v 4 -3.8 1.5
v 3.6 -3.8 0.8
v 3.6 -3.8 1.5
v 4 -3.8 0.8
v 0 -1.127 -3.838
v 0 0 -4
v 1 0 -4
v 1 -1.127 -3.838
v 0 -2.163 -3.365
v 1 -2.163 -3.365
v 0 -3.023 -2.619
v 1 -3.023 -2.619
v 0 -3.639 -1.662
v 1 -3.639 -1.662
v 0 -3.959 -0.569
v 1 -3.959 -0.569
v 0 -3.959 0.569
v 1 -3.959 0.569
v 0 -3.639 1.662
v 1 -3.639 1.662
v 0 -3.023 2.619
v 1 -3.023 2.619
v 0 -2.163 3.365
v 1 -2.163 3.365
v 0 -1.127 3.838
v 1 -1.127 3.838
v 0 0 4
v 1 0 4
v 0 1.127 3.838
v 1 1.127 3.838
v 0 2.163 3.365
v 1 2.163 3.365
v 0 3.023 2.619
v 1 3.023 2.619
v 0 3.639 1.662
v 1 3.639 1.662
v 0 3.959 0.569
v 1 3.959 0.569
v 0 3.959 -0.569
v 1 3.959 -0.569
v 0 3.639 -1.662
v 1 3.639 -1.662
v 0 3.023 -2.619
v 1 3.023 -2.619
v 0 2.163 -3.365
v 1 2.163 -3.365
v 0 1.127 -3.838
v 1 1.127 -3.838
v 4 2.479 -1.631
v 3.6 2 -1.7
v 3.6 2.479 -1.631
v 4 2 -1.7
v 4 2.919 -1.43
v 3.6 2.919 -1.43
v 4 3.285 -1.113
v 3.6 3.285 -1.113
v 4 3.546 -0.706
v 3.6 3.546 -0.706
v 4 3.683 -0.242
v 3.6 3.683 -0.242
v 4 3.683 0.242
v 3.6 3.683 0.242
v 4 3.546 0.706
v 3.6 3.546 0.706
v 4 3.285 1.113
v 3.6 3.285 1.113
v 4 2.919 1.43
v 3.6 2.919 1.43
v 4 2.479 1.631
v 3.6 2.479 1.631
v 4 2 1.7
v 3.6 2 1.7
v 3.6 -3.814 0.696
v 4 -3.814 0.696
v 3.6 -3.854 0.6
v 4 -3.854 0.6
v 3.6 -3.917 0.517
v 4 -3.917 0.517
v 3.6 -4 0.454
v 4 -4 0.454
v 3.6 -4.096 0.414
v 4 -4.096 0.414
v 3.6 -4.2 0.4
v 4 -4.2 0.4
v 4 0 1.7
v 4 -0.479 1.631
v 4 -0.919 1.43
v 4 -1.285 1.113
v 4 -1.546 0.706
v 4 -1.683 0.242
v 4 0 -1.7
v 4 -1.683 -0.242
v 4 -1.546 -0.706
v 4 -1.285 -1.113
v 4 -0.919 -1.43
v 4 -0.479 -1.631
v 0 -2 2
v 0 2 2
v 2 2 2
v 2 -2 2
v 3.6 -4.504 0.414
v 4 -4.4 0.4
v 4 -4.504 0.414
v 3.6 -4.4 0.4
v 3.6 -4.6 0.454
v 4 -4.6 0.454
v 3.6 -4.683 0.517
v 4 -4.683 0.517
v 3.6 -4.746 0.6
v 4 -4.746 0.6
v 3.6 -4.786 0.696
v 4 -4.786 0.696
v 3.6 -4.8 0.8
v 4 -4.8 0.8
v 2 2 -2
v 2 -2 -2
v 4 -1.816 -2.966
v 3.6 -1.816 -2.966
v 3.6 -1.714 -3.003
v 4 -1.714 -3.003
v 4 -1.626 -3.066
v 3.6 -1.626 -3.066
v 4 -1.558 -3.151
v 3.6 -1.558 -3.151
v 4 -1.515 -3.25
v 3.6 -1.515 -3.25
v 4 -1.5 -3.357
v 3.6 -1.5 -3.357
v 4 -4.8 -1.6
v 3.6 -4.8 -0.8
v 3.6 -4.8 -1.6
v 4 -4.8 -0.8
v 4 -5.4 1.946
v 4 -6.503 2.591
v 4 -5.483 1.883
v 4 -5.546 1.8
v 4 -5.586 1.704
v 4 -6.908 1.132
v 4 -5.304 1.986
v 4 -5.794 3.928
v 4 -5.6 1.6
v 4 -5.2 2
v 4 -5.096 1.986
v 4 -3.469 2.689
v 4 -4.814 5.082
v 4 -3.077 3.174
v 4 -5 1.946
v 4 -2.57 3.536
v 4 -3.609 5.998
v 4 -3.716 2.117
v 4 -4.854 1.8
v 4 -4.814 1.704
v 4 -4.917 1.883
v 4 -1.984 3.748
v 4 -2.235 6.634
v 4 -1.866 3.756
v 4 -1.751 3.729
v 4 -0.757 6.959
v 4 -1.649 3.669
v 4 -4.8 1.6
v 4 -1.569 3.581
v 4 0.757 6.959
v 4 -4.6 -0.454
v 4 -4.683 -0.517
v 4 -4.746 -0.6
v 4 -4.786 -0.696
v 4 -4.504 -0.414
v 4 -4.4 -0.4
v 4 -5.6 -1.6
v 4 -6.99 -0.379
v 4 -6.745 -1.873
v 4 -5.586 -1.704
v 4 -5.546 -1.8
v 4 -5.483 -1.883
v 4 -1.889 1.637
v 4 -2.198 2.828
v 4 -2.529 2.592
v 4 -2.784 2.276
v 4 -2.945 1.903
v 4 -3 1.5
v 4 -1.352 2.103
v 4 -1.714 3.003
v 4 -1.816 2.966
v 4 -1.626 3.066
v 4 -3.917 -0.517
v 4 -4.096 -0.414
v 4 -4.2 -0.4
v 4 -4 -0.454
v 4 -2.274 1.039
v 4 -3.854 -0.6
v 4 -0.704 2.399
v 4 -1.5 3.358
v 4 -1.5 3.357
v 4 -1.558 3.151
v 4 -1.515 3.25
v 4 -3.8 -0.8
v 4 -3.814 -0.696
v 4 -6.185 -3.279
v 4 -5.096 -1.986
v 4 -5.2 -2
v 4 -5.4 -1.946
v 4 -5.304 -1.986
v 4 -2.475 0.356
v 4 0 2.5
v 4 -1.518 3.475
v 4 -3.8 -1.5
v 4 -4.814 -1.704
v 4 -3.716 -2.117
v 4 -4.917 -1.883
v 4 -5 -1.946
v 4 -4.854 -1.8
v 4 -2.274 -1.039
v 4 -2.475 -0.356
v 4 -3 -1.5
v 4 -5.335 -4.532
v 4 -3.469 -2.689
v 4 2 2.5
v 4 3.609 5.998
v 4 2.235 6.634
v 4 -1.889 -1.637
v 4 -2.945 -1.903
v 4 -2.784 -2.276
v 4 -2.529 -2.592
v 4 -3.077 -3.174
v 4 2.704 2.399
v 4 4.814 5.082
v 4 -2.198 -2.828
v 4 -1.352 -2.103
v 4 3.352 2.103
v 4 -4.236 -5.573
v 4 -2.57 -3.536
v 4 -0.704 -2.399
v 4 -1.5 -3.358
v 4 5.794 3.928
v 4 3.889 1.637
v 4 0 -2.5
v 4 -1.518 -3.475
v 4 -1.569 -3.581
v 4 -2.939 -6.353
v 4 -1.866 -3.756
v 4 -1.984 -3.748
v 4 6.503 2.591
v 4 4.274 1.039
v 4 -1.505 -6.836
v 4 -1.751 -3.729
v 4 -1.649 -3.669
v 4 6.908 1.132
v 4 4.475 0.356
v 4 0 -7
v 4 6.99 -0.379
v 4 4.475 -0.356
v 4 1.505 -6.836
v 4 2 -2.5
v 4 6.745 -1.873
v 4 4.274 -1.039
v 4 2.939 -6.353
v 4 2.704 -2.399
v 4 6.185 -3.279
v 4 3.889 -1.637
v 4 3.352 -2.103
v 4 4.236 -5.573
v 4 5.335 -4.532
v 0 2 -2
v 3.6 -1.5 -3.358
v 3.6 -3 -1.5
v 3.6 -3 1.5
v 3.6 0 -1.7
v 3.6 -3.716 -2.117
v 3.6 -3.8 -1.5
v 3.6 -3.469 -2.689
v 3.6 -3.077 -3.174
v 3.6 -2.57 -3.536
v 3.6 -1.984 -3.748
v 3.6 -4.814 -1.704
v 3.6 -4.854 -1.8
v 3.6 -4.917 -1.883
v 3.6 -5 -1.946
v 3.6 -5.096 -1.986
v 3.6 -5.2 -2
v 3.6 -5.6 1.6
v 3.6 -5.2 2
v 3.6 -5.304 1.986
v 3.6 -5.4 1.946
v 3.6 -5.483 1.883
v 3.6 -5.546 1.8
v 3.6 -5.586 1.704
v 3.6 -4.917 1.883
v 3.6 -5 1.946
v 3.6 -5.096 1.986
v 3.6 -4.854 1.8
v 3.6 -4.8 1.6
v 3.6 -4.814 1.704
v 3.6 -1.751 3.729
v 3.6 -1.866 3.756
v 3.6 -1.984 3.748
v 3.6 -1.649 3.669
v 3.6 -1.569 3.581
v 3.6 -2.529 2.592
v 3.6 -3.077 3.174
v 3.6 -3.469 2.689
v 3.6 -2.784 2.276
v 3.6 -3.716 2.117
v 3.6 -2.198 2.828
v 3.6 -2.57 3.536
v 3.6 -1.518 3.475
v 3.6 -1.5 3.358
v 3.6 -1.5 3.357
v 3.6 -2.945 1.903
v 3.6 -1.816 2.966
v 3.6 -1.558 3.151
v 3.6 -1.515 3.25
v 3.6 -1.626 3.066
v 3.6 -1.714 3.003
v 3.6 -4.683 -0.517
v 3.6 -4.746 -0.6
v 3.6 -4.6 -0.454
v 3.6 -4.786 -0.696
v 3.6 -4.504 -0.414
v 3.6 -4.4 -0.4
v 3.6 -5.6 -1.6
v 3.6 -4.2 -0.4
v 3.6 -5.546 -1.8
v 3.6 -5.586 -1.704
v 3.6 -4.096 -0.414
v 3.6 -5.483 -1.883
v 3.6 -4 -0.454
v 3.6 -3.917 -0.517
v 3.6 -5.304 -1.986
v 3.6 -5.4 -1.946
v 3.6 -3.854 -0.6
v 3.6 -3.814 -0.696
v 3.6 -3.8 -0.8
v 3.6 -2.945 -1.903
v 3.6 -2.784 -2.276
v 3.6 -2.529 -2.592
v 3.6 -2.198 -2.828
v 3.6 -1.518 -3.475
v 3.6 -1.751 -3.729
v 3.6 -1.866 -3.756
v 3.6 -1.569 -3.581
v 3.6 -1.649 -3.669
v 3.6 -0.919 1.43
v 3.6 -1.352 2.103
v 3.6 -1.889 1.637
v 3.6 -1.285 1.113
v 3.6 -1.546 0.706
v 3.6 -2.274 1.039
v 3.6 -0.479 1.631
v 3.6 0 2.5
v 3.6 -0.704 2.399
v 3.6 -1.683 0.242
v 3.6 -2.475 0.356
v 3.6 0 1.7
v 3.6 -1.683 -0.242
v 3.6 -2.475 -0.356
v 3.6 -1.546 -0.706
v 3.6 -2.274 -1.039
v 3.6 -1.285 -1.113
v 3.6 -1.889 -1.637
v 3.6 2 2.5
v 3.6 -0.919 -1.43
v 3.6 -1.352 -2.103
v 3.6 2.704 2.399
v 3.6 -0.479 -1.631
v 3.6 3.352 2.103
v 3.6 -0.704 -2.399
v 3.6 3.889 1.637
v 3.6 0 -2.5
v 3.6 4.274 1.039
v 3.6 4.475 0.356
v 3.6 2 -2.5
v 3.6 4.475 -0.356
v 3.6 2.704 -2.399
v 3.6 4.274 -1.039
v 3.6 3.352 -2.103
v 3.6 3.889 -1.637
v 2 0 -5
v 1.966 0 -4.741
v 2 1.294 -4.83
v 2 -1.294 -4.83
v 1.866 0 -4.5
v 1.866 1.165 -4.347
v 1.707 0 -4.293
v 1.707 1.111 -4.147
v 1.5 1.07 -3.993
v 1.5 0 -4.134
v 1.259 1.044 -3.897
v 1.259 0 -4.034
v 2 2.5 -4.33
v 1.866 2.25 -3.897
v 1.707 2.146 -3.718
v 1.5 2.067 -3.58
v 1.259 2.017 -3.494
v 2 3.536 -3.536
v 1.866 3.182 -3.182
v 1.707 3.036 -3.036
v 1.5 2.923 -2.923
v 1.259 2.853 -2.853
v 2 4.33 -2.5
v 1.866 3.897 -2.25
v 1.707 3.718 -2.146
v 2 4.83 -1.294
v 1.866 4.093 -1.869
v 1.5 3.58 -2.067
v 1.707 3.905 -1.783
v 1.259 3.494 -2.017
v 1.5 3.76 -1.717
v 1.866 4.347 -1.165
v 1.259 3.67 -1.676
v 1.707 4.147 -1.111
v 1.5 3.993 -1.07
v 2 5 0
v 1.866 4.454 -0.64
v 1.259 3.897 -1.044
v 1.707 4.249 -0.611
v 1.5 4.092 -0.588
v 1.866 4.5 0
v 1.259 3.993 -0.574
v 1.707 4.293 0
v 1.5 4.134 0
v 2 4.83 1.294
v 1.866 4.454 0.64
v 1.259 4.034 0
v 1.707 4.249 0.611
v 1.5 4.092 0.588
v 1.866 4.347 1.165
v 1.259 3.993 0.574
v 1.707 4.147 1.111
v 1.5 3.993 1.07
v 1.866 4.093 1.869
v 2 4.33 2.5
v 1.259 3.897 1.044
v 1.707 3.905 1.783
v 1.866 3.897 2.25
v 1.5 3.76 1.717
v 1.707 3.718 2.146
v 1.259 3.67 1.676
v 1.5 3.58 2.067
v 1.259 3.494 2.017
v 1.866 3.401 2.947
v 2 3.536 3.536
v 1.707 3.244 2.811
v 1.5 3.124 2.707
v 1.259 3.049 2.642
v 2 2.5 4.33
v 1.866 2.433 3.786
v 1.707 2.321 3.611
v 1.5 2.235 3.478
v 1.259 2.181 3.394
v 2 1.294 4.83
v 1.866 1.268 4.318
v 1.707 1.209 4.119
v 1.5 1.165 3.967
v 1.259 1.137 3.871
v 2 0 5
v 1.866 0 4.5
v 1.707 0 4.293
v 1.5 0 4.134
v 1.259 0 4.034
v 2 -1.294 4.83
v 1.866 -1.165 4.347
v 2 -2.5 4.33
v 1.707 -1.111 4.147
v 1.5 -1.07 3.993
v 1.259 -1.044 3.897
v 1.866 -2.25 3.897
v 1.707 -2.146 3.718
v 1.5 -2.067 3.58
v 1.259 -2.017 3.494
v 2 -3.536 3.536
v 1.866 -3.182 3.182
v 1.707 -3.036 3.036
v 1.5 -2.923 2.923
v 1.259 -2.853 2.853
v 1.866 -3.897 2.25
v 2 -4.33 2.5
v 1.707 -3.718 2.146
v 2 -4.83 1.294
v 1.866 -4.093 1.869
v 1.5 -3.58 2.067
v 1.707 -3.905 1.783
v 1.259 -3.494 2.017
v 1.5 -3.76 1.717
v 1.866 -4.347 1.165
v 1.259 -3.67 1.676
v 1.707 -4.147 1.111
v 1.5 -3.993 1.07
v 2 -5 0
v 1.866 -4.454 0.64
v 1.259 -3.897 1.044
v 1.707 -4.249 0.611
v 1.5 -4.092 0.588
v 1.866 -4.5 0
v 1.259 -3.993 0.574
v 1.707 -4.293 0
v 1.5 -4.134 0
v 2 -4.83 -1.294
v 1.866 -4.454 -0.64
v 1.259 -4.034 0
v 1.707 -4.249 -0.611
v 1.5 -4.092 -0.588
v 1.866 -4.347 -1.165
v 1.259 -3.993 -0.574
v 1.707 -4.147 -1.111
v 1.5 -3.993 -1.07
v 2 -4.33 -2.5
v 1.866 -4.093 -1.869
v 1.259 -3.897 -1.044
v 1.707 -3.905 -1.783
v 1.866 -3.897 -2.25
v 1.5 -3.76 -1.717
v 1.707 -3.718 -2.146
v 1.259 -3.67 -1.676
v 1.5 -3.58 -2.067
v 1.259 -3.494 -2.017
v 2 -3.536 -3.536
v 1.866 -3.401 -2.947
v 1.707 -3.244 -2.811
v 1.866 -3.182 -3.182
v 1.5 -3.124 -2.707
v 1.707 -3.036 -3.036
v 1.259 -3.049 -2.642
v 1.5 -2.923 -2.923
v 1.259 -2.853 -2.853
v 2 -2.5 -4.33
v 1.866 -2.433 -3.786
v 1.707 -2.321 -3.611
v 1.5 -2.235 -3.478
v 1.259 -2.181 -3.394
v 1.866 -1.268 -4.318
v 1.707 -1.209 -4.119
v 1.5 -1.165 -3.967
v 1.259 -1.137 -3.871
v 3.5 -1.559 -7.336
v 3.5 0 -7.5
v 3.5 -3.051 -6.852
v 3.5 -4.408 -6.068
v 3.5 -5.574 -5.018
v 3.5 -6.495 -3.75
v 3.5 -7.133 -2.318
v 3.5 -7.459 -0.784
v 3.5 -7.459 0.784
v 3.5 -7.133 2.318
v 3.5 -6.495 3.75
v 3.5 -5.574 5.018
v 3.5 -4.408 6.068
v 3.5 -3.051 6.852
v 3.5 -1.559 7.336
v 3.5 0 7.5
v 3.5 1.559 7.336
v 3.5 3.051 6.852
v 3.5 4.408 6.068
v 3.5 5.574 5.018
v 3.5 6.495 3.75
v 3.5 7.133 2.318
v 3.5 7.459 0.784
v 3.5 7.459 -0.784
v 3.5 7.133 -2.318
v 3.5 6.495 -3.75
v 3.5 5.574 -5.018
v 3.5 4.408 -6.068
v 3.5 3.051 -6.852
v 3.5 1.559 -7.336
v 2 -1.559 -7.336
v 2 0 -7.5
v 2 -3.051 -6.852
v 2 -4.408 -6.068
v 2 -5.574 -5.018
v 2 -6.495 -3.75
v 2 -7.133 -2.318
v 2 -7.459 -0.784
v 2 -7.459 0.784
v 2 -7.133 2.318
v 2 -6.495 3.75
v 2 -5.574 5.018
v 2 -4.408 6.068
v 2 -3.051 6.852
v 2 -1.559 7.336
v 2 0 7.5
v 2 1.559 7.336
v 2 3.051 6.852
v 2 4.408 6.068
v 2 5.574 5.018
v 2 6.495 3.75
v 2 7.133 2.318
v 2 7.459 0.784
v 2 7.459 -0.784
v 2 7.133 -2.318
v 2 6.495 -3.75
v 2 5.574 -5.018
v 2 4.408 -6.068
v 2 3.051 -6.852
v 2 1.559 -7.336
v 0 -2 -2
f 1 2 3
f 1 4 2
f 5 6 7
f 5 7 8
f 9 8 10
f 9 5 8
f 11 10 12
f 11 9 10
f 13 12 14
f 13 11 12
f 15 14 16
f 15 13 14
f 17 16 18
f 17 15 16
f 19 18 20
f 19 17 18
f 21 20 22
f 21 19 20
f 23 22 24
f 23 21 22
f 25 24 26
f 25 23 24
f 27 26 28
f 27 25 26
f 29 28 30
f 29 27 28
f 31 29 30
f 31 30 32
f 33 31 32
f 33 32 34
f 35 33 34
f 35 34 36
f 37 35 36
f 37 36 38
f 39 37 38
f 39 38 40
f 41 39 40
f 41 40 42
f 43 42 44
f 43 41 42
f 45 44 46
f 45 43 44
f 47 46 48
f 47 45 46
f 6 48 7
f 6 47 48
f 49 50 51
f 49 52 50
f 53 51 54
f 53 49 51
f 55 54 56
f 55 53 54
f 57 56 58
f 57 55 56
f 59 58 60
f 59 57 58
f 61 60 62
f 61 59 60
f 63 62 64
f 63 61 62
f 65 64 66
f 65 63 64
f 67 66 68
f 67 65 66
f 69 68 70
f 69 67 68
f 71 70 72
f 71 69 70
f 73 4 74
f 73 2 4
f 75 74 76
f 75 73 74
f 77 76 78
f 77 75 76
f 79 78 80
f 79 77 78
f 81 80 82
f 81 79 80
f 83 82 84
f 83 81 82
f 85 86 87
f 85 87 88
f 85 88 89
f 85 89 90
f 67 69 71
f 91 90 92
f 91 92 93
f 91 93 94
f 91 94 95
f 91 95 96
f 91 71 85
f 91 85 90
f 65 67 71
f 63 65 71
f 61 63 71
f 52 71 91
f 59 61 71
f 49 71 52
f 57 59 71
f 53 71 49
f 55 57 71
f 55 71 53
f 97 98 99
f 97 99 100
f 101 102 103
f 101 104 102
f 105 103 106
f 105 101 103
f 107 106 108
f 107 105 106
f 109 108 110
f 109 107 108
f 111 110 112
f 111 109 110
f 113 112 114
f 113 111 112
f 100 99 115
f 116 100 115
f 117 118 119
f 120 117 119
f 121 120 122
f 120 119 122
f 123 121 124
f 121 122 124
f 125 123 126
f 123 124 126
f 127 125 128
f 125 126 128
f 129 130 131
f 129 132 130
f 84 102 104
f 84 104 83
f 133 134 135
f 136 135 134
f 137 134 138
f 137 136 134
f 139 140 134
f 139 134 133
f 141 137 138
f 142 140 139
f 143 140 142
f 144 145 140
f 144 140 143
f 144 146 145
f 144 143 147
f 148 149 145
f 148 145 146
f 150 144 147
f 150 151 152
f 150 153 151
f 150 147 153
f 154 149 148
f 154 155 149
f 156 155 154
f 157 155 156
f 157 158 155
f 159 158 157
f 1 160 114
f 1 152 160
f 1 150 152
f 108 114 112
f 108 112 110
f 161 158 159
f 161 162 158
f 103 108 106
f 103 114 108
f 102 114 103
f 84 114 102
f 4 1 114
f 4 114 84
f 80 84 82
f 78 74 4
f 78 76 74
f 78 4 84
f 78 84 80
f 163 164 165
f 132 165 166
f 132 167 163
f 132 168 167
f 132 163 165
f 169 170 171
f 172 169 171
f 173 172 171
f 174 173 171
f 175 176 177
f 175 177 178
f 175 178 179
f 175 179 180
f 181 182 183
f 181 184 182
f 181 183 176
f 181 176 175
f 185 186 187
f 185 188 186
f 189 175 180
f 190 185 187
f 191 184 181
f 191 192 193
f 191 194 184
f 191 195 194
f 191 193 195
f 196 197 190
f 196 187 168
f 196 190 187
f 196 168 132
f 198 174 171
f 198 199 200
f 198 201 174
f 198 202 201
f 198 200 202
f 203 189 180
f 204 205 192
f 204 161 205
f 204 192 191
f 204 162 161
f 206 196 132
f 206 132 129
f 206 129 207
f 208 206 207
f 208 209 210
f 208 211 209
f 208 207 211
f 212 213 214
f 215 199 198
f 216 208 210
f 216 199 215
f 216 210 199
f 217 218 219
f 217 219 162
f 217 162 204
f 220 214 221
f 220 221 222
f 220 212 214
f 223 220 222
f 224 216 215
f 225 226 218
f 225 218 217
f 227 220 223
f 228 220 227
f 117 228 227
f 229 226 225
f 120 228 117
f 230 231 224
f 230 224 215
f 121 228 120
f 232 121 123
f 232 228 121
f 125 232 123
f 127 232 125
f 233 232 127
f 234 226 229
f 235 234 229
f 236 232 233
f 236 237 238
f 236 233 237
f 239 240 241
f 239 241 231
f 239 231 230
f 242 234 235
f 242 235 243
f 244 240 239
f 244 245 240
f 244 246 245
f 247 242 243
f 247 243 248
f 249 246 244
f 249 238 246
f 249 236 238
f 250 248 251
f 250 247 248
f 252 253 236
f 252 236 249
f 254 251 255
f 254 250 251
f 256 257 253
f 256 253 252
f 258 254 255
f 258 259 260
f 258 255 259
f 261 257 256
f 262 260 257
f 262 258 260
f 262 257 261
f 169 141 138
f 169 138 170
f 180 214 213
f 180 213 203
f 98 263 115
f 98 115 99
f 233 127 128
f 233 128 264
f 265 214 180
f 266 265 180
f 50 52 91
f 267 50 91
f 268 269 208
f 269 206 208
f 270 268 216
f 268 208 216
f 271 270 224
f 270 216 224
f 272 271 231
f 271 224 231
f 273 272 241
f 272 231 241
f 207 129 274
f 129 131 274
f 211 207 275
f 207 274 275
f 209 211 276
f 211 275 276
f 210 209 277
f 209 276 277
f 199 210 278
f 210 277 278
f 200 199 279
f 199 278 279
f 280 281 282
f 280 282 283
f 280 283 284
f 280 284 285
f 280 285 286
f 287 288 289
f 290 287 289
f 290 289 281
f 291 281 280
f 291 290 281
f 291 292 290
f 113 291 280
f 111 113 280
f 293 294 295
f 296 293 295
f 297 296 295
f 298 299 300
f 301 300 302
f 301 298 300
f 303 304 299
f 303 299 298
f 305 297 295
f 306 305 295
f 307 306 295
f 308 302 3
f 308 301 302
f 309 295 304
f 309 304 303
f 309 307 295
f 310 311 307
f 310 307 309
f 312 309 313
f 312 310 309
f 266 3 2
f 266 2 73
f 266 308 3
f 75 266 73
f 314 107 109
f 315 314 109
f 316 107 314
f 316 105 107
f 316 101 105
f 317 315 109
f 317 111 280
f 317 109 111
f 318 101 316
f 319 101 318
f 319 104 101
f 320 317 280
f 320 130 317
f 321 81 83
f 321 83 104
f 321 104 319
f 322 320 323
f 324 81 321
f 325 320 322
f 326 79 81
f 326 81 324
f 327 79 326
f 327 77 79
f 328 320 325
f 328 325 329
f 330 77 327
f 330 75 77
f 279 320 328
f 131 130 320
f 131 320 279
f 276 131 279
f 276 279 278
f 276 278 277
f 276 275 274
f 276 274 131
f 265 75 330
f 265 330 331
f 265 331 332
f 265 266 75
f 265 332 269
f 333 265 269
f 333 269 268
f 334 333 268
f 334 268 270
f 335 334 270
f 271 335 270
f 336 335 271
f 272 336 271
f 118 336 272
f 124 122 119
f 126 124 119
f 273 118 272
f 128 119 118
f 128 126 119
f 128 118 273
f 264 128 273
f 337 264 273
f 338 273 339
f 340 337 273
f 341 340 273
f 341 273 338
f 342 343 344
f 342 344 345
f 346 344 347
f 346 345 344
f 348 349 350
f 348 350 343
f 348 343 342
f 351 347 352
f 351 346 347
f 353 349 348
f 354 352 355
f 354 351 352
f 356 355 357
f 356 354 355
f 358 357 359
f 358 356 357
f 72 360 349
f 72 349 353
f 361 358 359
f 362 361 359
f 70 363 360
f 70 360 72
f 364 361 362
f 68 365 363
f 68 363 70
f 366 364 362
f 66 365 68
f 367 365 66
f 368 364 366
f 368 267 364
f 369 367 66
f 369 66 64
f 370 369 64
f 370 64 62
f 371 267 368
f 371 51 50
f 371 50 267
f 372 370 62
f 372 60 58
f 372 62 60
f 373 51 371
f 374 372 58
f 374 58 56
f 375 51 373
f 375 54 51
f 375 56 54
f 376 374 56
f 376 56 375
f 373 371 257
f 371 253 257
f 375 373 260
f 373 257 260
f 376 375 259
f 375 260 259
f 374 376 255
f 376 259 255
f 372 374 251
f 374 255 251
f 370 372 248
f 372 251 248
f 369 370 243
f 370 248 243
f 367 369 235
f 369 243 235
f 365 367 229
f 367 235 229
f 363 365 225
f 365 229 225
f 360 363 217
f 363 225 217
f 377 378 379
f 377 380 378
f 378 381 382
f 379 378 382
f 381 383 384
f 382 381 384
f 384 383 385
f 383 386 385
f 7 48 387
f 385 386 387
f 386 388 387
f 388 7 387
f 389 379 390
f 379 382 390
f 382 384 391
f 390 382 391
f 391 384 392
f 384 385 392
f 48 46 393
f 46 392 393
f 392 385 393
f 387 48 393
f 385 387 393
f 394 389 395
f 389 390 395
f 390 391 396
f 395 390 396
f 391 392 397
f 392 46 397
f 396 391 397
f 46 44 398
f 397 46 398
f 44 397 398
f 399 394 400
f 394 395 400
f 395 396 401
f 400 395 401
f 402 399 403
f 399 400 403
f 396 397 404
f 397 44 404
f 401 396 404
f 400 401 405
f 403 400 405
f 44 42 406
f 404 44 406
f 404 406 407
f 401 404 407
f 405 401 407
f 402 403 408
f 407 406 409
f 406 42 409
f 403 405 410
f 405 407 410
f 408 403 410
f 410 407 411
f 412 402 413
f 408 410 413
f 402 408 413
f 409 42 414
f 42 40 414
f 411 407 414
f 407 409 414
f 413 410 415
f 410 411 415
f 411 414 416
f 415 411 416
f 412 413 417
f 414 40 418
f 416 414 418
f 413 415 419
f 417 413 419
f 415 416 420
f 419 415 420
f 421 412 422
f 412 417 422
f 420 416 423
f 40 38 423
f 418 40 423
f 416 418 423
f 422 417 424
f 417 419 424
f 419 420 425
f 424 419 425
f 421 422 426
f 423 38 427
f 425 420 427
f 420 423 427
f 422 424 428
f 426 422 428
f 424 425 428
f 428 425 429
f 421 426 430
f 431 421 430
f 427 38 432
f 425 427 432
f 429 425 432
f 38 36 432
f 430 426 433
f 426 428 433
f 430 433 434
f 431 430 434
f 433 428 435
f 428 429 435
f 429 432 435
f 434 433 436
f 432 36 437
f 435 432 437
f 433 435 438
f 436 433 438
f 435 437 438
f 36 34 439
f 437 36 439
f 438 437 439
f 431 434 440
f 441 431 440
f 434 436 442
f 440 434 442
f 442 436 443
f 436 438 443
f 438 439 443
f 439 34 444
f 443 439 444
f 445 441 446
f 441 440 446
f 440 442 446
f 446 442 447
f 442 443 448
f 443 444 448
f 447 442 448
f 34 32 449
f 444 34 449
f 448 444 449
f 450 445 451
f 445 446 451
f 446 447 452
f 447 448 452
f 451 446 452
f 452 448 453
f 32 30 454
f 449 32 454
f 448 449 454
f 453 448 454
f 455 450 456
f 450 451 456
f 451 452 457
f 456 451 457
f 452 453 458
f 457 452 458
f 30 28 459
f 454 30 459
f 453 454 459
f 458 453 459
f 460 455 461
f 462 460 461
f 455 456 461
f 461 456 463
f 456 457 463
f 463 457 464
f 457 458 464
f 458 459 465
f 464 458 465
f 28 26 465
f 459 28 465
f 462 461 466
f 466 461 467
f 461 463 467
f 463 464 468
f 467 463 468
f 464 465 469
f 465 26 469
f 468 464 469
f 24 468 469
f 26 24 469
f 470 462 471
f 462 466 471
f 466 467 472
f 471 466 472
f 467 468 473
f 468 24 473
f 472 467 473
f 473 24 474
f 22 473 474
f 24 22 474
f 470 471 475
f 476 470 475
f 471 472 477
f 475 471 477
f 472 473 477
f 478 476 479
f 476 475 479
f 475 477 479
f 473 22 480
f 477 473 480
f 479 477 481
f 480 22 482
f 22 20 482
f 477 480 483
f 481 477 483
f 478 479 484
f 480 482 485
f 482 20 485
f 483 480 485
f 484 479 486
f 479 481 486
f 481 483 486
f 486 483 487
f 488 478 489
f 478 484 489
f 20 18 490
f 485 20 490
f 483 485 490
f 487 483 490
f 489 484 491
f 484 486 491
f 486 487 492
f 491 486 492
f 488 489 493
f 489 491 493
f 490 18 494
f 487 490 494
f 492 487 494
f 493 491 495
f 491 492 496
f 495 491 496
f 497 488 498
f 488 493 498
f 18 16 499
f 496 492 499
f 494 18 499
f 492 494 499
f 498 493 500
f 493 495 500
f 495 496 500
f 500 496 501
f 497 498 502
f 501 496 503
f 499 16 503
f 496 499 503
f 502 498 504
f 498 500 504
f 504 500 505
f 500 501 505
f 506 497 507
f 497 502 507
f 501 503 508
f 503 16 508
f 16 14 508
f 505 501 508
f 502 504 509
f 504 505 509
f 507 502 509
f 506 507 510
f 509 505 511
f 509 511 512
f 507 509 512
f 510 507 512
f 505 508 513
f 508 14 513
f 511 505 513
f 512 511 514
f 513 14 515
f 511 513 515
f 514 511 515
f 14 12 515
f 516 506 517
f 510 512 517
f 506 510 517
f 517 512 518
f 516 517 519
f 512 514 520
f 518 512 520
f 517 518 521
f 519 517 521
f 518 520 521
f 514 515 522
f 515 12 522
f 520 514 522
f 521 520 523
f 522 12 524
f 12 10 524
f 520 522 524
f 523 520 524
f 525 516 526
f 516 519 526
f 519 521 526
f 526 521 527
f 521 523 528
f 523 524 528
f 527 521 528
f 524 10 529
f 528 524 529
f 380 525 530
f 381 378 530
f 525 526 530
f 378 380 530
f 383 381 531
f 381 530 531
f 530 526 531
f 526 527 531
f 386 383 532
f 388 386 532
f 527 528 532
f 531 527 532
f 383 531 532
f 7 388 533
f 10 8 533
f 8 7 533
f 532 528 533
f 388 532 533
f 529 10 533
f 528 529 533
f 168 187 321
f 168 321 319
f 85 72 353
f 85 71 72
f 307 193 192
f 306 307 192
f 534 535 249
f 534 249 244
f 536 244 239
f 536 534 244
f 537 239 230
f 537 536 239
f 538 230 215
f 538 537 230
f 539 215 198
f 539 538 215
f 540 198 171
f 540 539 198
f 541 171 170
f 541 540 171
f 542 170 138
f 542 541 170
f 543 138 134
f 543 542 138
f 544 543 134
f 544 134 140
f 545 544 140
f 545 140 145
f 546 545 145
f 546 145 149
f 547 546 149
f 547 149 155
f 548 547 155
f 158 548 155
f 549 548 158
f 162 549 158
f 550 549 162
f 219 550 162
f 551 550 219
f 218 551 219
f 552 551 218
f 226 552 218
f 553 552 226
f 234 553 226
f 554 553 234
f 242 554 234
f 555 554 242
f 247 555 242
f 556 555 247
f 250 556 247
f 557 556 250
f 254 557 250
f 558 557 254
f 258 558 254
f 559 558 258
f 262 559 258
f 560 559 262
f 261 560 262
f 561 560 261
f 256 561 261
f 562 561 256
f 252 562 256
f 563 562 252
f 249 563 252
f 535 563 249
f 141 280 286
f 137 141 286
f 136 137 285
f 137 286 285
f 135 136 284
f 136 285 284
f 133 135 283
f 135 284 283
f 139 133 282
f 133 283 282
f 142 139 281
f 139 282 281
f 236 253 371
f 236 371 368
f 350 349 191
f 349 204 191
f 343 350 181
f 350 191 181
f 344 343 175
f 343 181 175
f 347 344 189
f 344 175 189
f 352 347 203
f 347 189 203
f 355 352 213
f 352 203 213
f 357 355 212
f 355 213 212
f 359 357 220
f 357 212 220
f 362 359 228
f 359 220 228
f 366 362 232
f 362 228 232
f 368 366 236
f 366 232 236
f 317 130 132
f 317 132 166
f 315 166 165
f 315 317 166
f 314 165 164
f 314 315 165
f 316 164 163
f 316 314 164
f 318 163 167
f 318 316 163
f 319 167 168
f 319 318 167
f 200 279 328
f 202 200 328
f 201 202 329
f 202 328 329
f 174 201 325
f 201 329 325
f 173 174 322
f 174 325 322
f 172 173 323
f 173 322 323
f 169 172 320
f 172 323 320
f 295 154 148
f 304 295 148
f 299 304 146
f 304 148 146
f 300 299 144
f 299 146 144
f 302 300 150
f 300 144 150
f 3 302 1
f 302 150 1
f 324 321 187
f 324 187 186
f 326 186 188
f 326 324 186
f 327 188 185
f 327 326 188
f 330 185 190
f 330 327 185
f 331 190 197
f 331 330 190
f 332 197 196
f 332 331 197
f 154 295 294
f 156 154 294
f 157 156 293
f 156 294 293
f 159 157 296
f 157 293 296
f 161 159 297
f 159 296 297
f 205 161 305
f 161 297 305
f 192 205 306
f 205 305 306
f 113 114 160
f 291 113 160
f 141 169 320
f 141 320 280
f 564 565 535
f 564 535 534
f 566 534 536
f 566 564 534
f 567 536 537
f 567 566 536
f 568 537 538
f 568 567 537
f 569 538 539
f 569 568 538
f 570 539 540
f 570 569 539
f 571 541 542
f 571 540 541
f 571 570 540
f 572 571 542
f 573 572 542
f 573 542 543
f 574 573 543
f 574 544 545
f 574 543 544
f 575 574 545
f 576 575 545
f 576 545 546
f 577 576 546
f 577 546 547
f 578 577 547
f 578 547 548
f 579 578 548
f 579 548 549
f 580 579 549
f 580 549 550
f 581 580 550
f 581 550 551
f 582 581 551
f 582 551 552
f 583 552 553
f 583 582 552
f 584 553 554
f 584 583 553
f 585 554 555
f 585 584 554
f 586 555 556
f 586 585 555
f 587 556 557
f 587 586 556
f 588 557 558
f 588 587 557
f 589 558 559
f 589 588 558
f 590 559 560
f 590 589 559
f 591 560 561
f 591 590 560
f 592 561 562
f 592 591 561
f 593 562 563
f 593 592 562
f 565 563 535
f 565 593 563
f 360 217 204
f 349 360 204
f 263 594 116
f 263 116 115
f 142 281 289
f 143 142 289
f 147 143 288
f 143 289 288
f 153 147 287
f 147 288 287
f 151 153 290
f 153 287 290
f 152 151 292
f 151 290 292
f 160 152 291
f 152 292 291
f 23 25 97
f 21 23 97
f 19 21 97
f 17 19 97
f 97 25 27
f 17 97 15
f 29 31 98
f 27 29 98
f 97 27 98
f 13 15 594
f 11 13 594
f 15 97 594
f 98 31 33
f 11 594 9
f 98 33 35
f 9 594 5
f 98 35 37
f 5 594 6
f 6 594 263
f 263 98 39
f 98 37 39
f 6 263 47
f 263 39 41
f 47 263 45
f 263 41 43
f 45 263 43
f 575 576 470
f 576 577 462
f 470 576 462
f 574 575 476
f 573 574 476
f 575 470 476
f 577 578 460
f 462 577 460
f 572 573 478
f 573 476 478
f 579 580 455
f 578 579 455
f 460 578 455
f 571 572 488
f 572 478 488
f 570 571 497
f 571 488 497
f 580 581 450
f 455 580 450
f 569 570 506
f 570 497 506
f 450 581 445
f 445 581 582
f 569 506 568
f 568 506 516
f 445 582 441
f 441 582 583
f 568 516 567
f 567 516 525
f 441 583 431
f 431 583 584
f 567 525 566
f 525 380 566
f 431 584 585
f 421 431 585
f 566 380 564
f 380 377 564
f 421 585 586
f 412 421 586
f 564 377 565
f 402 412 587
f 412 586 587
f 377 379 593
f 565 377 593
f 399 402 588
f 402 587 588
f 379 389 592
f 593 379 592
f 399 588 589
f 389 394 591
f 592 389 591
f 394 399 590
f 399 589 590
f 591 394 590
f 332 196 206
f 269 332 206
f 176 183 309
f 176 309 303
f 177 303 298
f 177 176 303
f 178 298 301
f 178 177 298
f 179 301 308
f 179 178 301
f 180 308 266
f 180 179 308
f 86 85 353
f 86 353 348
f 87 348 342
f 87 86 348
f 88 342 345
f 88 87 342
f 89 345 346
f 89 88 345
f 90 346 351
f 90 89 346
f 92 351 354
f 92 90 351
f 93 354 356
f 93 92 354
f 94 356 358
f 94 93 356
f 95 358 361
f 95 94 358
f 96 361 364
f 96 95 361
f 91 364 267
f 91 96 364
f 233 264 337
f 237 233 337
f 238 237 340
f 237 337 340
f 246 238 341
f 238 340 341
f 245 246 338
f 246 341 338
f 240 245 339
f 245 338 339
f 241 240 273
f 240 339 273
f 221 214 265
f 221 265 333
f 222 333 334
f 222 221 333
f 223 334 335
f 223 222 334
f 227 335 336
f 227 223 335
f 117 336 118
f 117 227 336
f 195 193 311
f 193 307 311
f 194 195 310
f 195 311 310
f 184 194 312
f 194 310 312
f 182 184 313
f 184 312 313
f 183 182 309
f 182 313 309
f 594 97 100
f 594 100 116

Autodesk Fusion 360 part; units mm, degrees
sketch "Sketch1" plane through (0, 0, 0) normal (1, 0, 0) x (0, 0, -1)
  circle A0 centre (0, 0) radius 4
  line L0 (2, 2) -> (-2, 2)
  line L1 (-2, 2) -> (-2, -2)
  line L2 (-2, -2) -> (2, -2)
  line L3 (2, -2) -> (2, 2)
  line L4 (2, 2) -> (-2, -2) construction
  line L5 (-2, 2) -> (2, -2) construction
  dimension "d1" = 8
  dimension "d2" = 4
  dimension "d3" = 4
extrude "Extrude1" add sketch "Sketch1" along normal blind 2
sketch "Sketch2" plane through (2, 0, 0) normal (1, 0, 0) x (0, 0, -1)
  line L0 (2, 2) -> (2, -2)
  line L1 (2, -2) -> (-2, -2)
  line L2 (-2, -2) -> (-2, 2)
  line L3 (-2, 2) -> (2, 2)
  circle A0 centre (0, 0) radius 4
  circle A1 centre (0, 0) radius 7.5
  dimension "d6" = 15
extrude "Extrude2" add sketch "Sketch2" along normal blind 2 contours L0 L1 L2 L3 | A0 | A1
fillet "Fillet1" radius 1 1 edges at (2, -1.4465, 3.7293)
chamfer "Chamfer1" distance 0.5 angle 45 1 edges at (4, -2.7121, 6.9925)
sketch "Sketch3" plane through (4, 0, 0) normal (1, 0, 0) x (0, 0, -1)
  circle A0 centre (0, 0) radius 7
  line L0 (0, 0) -> (0, 2)
  line L1 (0, -4.8) -> (2, -4.8)
  line L2 (2, -4.8) -> (2, -5.6)
  line L3 (2, -5.6) -> (-2, -5.6)
  line L4 (-2, -5.6) -> (-2, -4.8)
  line L5 (0, -4.8) -> (-2, -4.8)
  line L6 (0, -3) -> (1.5, -3)
  line L7 (0, -3.8) -> (1.5, -3.8)
  line L8 (0, -3) -> (-1.5, -3)
  line L9 (0, -3.8) -> (-1.5, -3.8)
  line L10 (2.5, 2) -> (2.5, 0)
  line L11 (-2.5, 2) -> (-2.5, 0)
  line L12 (-1.7, 2) -> (-2.5, 2) construction
  line L13 (0, 2) -> (2.5, 2) construction
  line L14 (-1.7, 2) -> (-1.7, 0)
  line L15 (1.7, 2) -> (1.7, 0)
  arc A1 (-1.6925, 0.16) -> (1.6925, 0.16) centre (0, 0) ccw
  arc A2 (1.6925, 1.84) -> (-1.6925, 1.84) centre (0, 2) ccw
  arc A3 (-1.6925, 1.84) -> (-1.7, 1.833) centre (0, 0) ccw
  arc A4 (-1.7, 0.167) -> (-1.6925, 0.16) centre (0, 2) ccw
  arc A5 (-2.5, 0) -> (2.5, 0) centre (0, 0) ccw
  arc A6 (1.7, 1.833) -> (1.6925, 1.84) centre (0, 0) ccw
  arc A7 (1.6925, 0.16) -> (1.7, 0.167) centre (0, 2) ccw
  arc A8 (2.5, 2) -> (-2.5, 2) centre (0, 2) ccw
  line L16 (3, -1.5) -> (3.8, -1.5)
  arc A9 (1.5, -3) -> (3, -1.5) centre (1.5, -1.5) ccw
  arc A10 (1.5, -3.8) -> (3.8, -1.5) centre (1.5, -1.5) ccw
  line L17 (-3, -1.5) -> (-3.8, -1.5)
  arc A11 (-3.8, -1.5) -> (-1.5, -3.8) centre (-1.5, -1.5) ccw
  arc A12 (-3, -1.5) -> (-1.5, -3) centre (-1.5, -1.5) ccw
  line L18 (-0.4, -3.8) -> (0.4, -3.8)
  line L19 (0.4, -3.8) -> (0.4, -4.8)
  line L20 (0.4, -4.8) -> (-0.4, -4.8)
  line L21 (-0.4, -4.8) -> (-0.4, -3.8)
  dimension "d12" = 0.8
  dimension "d13" = 0.8
  dimension "d14" = 0.8
  dimension "d15" = 5
  dimension "d16" = 5
  dimension "d17" = 2
  dimension "d18" = 0.8
  dimension "d19" = 3
  dimension "d20" = 1.5
  dimension "d21" = 1.5
  dimension "d24" = 1.5
  dimension "d25" = 0.8
  dimension "d26" = 1.5
  dimension "d27" = 0.8
  dimension "d28" = 0.8
  dimension "d29" = 1.5
  dimension "d30" = 4
  dimension "d31" = 2
  dimension "d32" = 1
  dimension "d33" = 0.8
  dimension "d34" = 0.4
extrude "Extrude3" cut sketch "Sketch3" against normal blind 0.4 contours L1 L5 L7 L9 L18 L19 L20 L21 | L1 L2 L3 L4 L5 L20 | L6 L7 L8 L9 L16 A9 A10 L17 A11 A12 L18 | L10 L11 A5 A8
fillet "Fillet2" radius 0.4 12 edges at (3.8, -5.6, 2) (3.8, -4.8, 2) (3.8, -4.8, 0.4) (3.8, -3.8, 0.4) (3.8, -4.8, -2) (3.8, -5.6, -2) (3.8, -4.8, -0.4) (3.8, -3.8, -0.4) (3.8, -1.5, 3) (3.8, -1.5, 3.8) (3.8, -1.5, -3.8) (3.8, -1.5, -3)
